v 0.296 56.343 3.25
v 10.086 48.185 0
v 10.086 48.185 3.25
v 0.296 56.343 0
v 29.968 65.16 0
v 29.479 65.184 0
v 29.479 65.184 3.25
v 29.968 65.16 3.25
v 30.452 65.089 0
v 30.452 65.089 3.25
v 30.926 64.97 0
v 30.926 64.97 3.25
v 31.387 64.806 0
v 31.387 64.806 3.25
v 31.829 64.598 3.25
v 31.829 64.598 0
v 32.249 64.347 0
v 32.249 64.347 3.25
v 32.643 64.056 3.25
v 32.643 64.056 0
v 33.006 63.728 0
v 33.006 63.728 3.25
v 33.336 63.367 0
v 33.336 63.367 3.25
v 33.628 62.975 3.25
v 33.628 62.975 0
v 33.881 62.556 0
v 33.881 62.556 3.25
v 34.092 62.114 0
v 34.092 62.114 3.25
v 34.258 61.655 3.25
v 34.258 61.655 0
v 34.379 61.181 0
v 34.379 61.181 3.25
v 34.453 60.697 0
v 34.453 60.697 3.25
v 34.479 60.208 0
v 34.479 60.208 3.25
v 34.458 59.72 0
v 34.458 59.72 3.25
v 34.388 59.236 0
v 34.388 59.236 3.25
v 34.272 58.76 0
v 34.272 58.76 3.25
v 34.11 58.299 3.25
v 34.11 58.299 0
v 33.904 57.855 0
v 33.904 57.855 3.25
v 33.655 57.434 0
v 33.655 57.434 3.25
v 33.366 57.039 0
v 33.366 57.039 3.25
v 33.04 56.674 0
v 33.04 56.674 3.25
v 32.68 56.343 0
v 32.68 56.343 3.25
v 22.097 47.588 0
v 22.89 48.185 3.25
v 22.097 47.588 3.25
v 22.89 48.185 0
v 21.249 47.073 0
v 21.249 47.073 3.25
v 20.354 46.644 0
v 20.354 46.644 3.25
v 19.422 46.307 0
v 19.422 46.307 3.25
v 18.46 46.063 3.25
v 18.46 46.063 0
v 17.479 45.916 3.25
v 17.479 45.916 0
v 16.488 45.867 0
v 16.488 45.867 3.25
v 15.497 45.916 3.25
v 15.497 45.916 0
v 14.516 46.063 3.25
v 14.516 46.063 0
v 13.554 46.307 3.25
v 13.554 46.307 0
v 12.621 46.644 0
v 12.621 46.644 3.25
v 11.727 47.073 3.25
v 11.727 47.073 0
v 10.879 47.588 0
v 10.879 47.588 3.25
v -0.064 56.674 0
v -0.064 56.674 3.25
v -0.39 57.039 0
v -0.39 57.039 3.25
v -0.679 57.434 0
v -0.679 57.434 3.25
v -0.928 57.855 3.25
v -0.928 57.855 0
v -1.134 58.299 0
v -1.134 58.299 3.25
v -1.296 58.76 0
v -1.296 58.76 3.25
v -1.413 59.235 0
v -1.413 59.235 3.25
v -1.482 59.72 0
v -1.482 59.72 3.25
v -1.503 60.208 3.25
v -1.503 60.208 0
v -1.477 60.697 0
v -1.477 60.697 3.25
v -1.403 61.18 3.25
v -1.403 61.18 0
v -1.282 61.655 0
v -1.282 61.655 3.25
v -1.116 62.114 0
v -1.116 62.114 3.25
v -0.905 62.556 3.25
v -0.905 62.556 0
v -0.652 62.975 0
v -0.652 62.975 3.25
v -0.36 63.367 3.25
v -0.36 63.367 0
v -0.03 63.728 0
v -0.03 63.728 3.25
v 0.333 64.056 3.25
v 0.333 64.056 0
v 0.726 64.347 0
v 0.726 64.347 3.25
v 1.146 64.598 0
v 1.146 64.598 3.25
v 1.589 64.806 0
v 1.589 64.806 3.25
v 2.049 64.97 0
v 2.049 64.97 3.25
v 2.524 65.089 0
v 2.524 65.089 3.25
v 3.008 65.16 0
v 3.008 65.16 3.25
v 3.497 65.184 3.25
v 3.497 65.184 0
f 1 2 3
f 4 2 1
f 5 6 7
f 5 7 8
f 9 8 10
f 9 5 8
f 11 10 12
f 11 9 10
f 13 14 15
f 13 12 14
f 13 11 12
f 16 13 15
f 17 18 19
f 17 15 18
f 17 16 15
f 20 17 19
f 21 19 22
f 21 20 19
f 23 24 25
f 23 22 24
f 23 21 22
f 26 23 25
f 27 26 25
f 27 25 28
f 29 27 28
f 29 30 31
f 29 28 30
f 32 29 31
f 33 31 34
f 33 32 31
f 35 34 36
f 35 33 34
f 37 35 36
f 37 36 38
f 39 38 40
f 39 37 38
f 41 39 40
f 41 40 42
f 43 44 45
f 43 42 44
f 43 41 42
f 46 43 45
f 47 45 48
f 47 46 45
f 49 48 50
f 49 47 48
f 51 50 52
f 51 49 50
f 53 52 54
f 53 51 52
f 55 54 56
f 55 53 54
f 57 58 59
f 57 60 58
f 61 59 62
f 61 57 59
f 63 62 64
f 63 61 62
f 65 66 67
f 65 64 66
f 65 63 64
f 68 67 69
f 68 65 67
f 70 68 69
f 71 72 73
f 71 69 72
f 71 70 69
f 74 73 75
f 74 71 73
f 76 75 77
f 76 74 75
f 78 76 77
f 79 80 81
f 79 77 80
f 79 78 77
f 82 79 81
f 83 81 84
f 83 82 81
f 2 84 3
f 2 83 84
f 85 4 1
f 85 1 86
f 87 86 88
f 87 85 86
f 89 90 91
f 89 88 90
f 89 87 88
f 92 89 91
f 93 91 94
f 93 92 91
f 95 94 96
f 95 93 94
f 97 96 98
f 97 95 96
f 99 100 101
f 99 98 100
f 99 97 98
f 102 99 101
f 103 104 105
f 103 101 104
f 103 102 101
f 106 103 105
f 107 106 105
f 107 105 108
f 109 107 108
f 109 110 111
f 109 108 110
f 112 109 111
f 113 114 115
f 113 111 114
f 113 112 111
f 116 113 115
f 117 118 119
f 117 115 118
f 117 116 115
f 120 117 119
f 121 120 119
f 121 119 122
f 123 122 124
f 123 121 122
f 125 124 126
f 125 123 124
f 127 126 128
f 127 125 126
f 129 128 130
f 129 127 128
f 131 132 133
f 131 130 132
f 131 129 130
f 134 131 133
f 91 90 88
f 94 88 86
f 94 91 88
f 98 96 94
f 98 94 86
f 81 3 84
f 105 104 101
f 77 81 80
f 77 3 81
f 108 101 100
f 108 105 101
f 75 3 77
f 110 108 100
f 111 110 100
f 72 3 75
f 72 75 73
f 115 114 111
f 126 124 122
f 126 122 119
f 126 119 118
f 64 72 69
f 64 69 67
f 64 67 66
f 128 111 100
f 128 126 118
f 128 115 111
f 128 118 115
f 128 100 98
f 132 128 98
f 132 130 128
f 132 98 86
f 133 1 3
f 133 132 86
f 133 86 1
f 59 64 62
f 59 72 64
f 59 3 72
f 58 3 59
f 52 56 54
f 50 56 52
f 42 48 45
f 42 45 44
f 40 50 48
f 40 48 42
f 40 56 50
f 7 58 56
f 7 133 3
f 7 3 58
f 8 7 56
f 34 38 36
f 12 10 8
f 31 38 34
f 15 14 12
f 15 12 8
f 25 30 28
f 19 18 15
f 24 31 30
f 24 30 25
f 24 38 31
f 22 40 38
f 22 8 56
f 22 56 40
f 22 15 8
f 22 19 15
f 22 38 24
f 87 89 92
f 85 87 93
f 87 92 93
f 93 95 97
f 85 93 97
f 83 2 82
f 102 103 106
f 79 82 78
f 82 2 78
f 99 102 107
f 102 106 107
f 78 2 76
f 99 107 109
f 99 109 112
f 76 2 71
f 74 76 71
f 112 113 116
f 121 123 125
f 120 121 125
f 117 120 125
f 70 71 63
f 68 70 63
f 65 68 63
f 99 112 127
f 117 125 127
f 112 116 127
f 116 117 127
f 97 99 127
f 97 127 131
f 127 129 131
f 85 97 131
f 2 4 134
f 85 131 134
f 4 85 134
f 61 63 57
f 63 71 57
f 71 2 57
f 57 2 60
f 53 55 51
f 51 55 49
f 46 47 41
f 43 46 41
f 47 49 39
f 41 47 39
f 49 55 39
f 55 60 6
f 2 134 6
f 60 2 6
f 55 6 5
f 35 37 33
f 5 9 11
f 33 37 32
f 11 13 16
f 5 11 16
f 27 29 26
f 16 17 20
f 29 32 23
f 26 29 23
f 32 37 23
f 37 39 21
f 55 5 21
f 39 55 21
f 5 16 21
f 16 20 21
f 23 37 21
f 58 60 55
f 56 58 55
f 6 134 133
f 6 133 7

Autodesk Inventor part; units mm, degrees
ref_plane "YZ Plane" through (0, 0, 0) normal (1, 0, 0) x (0, 1, 0)
ref_plane "XZ Plane" through (0, 0, 0) normal (0, 1, 0) x (-1, 0, 0)
ref_plane "XY Plane" through (0, 0, 0) normal (0, 0, 1) x (1, 0, 0)
sketch "Sketch1" plane through (0, 0, 0) normal (0, 0, 1) x (1, 0, 0)
  line L0 (-92.7646, -8.503) -> (-89.7646, -8.503)
  line L1 (-89.7646, -8.503) -> (-89.7646, -11.753)
  line L2 (-89.7646, -11.753) -> (-92.7646, -11.753)
  line L3 (-92.7646, -11.753) -> (-92.7646, -8.503)
  line L4 (-92.7646, -21.6527) -> (-89.7646, -21.6527)
  line L5 (-89.7646, -21.6527) -> (-89.7646, -21.7527)
  line L6 (-89.7646, -21.7527) -> (-92.7646, -21.7527)
  line L7 (-92.7646, -21.7527) -> (-92.7646, -21.6527)
  line L8 (-43.5121, 19.6165) -> (76.4879, 19.6165)
  line L9 (76.4879, 19.6165) -> (76.4879, 99.6165)
  line L10 (76.4879, 99.6165) -> (-43.5121, 99.6165)
  line L11 (-43.5121, 99.6165) -> (-43.5121, 19.6165)
  line L12 (16.4879, 99.6165) -> (16.4879, 19.6165) construction
  line L13 (-43.5121, 59.6165) -> (76.4879, 59.6165) construction
  line L14 (3.9879, 63.1165) -> (7.2379, 63.1165)
  line L15 (7.2379, 63.1165) -> (7.2379, 56.1165)
  line L16 (7.2379, 56.1165) -> (3.9879, 56.1165)
  line L17 (3.9879, 56.1165) -> (3.9879, 63.1165)
  line L18 (3.9879, 59.6165) -> (7.2379, 59.6165) construction
  line L19 (28.9879, 63.1165) -> (25.7379, 63.1165)
  line L20 (25.7379, 63.1165) -> (25.7379, 56.1165)
  line L21 (25.7379, 56.1165) -> (28.9879, 56.1165)
  line L22 (28.9879, 56.1165) -> (28.9879, 63.1165)
  line L23 (28.9879, 59.6165) -> (25.7379, 59.6165) construction
  circle A0 centre (-1.5121, 74.6165) radius 5
  circle A1 centre (34.4879, 74.6165) radius 5
  circle A2 centre (-3.5121, 37.1165) radius 2.5
  circle A3 centre (6.4879, 37.1165) radius 2.5
  circle A4 centre (16.4879, 37.1165) radius 2.5
  circle A5 centre (26.4879, 37.1165) radius 2.5
  circle A6 centre (36.4879, 37.1165) radius 2.5
  circle A7 centre (-3.5121, 44.1165) radius 2.5
  line L24 (-6.0121, 37.1165) -> (-1.0121, 37.1165) construction
  circle A8 centre (-3.5121, 30.1165) radius 2.5
  line L25 (6.4879, 39.6165) -> (6.4879, 34.6165) construction
  circle A9 centre (36.4879, 44.1165) radius 2.5
  circle A10 centre (36.4879, 30.1165) radius 2.5
  circle A11 centre (16.4879, 30.1165) radius 2.5
  line L26 (-43.5121, 99.6165) -> (-53.5121, 99.6165)
  line L27 (-53.5121, 99.6165) -> (-53.5121, 19.6165)
  line L28 (-53.5121, 19.6165) -> (-43.5121, 19.6165)
  line L29 (-43.5121, 19.6165) -> (-43.5121, 99.6165)
  arc A12 (16.4879, 99.6165) -> (-34.1013, 83.0147) centre (13.3048, 23.9368) ccw
  arc A13 (-34.1013, 36.2182) -> (16.4879, 19.6165) centre (13.3048, 95.2961) ccw
  arc A14 (-34.1013, 83.0147) -> (-34.1013, 36.2182) centre (-15.3258, 59.6165) ccw
  arc A15 (67.0771, 83.0147) -> (16.4879, 99.6165) centre (19.6709, 23.9368) ccw
  arc A16 (16.4879, 19.6165) -> (67.0771, 36.2182) centre (19.6709, 95.2961) ccw
  arc A17 (67.0771, 36.2182) -> (67.0771, 83.0147) centre (48.3015, 59.6165) ccw
  line L30 (10.086, 48.1846) -> (0.2957, 56.3433)
  line L31 (3.4966, 65.1844) -> (16.4879, 65.1844)
  arc A18 (3.4966, 65.1844) -> (0.2957, 56.3433) centre (3.4966, 60.1844) ccw
  line L32 (22.8898, 48.1846) -> (32.6801, 56.3433)
  line L33 (29.4791, 65.1844) -> (16.4879, 65.1844)
  arc A19 (32.6801, 56.3433) -> (29.4791, 65.1844) centre (29.4791, 60.1844) ccw
  arc A20 (10.086, 48.1846) -> (22.8898, 48.1846) centre (16.4879, 55.8667) ccw
  point P0 (0, 0)
  point P1 (16.4879, 42.8496)
  dimension "d3" = 3
  dimension "mat" = 3.25
  dimension "d5" = 3
  dimension "kerf" = 0.1
  dimension "d42" = 120
  dimension "d43" = 80
  dimension "d44" = 3.25
  dimension "d45" = 7
  dimension "d47" = 9.25
  dimension "d50" = 10
  dimension "d51" = 13
  dimension "d54" = 20
  dimension "d55" = 5
  dimension "d58" = 10
  dimension "d63" = 15
  dimension "d64" = 5
  dimension "d65" = 7
  dimension "d69" = 10
  dimension "d70" = 30
  dimension "d73" = 5
  dimension "d74" = 10
extrude "Extrusion11" add sketch "Sketch1" along normal blind 3.25 contours L14 L15 L16 L17 | L22 L21 L20 L19 | L30 A18 L31 L33 A19 L32 A20
equation "\"d44\" = mat"
equation "\"d77\" = mat"
properties part number "body-back"
